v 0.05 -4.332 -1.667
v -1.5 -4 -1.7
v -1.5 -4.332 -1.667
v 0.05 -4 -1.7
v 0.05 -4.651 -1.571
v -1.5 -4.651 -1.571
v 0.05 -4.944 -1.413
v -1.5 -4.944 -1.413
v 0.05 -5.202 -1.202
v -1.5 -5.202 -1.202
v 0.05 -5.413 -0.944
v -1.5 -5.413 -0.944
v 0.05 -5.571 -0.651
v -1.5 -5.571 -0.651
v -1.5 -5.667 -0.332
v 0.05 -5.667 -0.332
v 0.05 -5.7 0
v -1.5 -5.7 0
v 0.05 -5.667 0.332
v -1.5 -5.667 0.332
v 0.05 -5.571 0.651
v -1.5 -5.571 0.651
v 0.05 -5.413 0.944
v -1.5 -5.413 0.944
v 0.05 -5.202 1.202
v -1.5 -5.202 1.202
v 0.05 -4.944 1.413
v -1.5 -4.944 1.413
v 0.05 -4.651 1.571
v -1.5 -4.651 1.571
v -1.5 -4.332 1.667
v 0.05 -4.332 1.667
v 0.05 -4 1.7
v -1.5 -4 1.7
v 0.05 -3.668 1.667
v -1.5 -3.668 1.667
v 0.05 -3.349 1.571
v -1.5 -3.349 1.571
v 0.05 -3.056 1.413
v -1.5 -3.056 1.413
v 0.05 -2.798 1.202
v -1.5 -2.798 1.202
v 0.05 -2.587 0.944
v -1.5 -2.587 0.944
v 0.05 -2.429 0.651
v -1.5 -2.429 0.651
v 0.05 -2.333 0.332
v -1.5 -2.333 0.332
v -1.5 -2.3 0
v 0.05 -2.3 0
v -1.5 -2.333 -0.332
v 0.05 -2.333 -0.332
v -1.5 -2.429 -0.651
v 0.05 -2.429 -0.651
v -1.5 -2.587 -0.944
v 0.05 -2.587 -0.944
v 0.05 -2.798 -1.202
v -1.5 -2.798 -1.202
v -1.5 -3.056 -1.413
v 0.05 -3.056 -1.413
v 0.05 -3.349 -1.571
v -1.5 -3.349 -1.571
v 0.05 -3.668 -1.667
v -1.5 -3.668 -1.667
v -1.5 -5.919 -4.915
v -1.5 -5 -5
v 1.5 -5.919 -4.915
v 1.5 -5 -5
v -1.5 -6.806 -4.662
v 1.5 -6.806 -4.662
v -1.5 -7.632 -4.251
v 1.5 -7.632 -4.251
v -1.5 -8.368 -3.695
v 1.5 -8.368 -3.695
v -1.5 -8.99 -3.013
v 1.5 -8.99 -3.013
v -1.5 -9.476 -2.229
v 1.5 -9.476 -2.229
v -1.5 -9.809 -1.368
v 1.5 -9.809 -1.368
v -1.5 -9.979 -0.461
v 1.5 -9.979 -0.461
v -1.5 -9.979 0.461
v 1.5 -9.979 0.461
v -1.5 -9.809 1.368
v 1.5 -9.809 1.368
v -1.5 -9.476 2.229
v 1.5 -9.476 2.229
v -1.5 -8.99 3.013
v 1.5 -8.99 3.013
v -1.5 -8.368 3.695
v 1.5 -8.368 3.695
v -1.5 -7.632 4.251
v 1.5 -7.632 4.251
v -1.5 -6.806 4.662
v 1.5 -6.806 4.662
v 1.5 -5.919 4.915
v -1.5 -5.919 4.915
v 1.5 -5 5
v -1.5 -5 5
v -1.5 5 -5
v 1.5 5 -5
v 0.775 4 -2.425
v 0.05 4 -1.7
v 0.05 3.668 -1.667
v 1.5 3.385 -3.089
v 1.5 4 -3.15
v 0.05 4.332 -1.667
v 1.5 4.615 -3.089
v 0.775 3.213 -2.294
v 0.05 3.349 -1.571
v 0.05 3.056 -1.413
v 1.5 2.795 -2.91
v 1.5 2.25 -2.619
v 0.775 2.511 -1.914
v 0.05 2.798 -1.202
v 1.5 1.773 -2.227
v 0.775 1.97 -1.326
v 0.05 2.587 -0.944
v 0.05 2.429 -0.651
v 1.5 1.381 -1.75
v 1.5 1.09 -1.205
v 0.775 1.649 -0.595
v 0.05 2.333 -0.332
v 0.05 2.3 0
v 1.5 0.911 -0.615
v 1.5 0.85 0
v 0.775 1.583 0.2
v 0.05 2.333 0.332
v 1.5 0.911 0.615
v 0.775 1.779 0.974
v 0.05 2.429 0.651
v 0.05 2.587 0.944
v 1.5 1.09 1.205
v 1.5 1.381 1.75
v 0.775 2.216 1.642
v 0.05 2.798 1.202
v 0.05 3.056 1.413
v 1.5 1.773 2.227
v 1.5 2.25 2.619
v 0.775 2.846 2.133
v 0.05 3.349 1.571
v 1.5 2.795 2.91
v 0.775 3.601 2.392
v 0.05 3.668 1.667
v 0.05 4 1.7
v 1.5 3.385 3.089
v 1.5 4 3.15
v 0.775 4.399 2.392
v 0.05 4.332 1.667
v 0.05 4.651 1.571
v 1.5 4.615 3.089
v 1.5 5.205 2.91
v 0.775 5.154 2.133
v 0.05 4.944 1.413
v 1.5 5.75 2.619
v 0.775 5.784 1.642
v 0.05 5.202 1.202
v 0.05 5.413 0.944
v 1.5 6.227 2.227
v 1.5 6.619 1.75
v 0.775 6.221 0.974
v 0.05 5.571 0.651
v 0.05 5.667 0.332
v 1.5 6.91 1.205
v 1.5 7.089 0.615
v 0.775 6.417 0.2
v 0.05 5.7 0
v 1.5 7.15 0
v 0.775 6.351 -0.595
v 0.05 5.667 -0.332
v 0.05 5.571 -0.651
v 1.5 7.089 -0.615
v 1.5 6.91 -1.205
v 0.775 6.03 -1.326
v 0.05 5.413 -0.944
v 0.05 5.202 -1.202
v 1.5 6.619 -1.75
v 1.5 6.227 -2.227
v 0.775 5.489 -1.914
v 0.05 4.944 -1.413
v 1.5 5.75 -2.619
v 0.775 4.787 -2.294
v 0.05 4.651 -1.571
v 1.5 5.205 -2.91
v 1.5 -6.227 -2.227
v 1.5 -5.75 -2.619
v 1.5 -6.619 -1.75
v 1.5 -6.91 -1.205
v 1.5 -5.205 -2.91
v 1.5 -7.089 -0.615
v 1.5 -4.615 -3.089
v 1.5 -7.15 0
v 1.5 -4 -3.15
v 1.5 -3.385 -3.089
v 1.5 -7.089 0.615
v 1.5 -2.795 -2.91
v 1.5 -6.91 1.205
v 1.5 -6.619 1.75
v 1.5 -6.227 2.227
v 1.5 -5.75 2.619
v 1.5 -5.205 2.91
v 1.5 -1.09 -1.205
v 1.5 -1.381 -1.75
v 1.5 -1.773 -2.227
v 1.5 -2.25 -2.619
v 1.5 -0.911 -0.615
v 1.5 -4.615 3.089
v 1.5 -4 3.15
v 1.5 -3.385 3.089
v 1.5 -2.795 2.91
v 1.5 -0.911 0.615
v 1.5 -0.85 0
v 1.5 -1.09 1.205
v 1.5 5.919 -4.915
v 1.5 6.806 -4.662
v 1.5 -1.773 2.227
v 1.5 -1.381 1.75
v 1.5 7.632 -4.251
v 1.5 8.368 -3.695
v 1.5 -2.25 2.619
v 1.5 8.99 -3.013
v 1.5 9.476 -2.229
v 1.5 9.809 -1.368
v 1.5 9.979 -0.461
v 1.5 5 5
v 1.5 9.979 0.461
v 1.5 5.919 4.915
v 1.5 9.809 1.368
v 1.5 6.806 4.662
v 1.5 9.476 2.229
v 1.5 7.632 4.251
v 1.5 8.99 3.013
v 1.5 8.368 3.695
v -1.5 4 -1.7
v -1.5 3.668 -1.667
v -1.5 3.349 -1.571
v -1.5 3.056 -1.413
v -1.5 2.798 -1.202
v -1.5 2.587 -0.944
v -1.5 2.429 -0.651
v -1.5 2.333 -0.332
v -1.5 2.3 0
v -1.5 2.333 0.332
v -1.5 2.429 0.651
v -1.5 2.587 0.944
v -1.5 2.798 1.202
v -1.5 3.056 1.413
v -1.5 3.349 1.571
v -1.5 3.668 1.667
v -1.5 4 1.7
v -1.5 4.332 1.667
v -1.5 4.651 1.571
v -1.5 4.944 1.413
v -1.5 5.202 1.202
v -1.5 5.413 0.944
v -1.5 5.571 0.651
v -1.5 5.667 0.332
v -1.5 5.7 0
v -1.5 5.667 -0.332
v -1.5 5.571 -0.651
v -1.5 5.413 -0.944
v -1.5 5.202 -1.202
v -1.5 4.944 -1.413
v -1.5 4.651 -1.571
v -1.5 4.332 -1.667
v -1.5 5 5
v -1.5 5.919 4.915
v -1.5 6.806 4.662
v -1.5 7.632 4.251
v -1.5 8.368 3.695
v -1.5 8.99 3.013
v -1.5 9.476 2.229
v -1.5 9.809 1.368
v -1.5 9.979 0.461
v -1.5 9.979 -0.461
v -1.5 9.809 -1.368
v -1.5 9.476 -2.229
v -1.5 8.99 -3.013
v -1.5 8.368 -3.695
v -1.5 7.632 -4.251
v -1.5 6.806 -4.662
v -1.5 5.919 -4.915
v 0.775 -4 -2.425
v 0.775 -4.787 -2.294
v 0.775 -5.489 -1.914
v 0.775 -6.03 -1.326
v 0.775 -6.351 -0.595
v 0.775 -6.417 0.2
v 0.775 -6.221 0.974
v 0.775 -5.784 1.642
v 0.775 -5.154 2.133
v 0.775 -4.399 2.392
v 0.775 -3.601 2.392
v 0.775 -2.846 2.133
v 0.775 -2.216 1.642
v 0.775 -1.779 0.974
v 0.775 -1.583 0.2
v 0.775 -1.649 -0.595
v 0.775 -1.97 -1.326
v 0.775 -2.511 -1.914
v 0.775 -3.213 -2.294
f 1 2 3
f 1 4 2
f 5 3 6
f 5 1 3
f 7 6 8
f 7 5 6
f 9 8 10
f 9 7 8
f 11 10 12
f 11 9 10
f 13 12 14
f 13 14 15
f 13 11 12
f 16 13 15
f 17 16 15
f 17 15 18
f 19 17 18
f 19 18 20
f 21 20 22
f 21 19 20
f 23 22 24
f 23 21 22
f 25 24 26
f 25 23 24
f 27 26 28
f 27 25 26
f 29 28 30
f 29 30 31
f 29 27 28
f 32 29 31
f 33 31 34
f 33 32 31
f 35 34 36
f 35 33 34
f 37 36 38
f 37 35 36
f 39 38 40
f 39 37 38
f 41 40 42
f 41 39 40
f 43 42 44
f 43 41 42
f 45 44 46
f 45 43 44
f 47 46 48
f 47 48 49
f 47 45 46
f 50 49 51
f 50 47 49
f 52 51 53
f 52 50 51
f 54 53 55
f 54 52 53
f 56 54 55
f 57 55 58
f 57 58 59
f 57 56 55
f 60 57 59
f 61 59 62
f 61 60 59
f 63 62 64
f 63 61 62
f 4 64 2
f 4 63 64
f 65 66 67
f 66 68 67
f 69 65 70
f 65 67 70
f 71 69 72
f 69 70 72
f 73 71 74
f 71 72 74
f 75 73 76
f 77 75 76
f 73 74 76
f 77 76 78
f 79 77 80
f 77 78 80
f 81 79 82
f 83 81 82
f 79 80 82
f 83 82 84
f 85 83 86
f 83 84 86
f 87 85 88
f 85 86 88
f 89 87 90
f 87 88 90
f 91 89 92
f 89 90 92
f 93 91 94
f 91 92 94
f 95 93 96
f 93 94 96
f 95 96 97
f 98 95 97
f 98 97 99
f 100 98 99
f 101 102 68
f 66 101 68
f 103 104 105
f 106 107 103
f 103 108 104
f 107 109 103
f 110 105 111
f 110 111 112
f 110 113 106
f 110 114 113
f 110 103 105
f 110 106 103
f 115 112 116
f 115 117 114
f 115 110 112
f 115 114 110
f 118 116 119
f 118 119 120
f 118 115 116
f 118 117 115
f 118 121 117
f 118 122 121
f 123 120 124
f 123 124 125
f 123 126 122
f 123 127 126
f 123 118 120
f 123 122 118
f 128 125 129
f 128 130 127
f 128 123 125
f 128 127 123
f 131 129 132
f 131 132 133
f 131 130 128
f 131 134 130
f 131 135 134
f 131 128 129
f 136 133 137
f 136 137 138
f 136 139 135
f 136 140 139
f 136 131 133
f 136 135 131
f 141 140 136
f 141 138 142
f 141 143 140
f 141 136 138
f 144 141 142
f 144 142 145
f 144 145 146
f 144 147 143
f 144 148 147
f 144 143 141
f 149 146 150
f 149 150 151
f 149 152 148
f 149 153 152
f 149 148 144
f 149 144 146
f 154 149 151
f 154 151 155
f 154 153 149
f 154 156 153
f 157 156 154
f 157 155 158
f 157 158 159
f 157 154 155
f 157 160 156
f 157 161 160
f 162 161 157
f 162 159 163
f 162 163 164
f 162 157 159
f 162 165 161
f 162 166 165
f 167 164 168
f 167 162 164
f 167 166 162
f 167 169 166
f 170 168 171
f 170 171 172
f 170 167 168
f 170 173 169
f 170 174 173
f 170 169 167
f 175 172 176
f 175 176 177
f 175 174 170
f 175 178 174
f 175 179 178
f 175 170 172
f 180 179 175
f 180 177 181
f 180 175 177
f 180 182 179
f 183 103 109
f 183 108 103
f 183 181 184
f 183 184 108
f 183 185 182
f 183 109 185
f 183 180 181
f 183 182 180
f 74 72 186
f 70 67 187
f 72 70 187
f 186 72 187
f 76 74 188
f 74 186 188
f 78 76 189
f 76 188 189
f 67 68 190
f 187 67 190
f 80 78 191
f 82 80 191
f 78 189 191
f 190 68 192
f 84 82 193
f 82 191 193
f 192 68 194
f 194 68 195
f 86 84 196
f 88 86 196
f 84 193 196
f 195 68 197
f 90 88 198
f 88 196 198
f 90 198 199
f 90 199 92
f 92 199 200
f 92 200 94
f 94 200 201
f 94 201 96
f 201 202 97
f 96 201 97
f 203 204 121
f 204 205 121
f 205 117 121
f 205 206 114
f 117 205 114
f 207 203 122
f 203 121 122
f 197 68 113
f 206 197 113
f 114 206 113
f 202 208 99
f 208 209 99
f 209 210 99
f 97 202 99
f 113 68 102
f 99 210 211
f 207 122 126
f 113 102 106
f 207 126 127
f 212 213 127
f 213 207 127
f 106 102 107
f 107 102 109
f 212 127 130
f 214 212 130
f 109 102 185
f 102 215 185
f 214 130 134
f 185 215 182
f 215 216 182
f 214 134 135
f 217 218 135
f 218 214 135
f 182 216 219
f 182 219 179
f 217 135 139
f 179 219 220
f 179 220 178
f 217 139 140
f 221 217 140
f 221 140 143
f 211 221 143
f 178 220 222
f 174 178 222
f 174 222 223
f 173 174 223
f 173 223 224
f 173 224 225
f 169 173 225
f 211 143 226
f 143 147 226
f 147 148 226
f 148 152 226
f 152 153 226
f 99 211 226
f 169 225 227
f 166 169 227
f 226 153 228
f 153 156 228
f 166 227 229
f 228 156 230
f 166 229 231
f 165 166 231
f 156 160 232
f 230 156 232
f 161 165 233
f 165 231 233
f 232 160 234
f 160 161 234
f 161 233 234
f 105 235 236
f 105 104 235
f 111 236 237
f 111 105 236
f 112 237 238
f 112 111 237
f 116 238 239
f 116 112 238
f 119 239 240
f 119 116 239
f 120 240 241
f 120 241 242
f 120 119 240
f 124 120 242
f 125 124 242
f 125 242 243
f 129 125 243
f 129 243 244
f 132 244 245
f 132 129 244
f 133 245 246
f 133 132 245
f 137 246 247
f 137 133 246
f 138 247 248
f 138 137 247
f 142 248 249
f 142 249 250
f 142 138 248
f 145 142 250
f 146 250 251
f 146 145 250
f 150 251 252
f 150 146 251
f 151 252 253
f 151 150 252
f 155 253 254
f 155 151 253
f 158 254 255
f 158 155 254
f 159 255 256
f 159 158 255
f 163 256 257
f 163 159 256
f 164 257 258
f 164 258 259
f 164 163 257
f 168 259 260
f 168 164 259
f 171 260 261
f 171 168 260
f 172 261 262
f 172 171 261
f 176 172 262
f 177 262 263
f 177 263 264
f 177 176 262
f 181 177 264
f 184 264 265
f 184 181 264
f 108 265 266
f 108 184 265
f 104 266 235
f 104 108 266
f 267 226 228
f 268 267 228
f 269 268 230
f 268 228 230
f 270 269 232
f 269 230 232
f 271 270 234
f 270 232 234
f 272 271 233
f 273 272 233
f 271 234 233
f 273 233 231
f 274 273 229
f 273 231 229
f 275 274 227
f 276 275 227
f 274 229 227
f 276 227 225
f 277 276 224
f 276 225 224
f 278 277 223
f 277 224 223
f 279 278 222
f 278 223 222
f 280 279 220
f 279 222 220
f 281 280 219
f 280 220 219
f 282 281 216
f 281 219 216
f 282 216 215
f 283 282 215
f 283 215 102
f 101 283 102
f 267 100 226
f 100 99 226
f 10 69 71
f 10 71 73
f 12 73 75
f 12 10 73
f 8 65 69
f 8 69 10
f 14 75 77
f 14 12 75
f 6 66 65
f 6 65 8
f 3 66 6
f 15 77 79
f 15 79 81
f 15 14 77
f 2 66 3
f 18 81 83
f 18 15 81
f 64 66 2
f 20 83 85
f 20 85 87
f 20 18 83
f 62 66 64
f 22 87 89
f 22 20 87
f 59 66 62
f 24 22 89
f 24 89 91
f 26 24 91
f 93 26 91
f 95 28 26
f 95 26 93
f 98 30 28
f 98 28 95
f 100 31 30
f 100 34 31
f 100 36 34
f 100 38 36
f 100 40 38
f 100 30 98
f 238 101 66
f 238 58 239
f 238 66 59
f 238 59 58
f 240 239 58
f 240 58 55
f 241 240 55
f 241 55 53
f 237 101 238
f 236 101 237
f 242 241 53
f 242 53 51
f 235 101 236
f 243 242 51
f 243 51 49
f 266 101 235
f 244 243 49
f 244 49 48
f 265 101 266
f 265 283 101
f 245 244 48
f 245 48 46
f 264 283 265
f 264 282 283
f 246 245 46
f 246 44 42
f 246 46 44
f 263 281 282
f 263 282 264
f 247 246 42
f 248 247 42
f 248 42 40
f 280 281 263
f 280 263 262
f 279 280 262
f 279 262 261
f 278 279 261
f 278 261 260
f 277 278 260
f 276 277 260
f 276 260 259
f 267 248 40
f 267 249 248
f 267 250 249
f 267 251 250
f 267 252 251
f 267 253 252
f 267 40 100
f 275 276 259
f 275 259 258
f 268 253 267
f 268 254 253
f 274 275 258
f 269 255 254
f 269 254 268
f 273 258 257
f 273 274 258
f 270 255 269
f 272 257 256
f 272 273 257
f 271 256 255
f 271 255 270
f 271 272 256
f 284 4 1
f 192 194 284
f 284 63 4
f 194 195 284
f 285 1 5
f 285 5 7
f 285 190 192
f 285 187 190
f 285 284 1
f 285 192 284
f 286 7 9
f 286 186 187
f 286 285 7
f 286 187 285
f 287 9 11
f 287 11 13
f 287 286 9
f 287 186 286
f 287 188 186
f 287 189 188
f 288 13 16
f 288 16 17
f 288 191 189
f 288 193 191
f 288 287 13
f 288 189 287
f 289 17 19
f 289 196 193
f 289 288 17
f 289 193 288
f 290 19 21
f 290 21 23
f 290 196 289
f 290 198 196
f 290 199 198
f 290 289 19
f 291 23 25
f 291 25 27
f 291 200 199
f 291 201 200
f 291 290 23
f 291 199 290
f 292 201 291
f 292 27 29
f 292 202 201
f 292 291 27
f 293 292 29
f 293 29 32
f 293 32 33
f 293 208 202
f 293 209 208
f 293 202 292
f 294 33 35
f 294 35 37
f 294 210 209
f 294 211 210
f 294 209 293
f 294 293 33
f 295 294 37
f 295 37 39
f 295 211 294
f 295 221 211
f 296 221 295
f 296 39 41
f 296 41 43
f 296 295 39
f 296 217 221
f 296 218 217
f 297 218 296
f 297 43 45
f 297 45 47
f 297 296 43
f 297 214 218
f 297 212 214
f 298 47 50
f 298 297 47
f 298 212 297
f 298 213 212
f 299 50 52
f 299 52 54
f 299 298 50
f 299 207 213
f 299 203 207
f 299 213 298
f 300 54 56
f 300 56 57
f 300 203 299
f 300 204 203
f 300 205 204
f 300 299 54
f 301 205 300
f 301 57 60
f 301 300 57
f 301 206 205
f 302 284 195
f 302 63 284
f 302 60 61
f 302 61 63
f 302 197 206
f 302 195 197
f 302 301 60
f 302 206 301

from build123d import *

# Parameters (mm, degrees)
BOSS_EXTRUDE1_DEPTH                          = 1.5
CSK_FOR_M3_COUNTERSUNK_FLAT_HEAD_SCR_2_COUNT = 2
CSK_FOR_M3_COUNTERSUNK_FLAT_HEAD_SCR_2_PITCH = 8


with BuildPart() as part:
    # Sketch1 → Boss-Extrude1 (new, symmetric)
    with BuildSketch(Plane(origin=(0, 0, 0), x_dir=(0, 0, -1), z_dir=(1, 0, 0))):
        with BuildLine():
            Line((5, 5), (5, -5))
            ThreePointArc((5, -5), (0, -10), (-5, -5))
            Line((-5, -5), (-5, 5))
            ThreePointArc((-5, 5), (0, 10), (5, 5))
        make_face()
    extrude(amount=BOSS_EXTRUDE1_DEPTH, both=True)

    # Sketch3 → CSK for M3 Countersunk Flat Head Screw1 (revolve, cut)
    with BuildSketch(Plane(origin=(1.5, 4, 0), x_dir=(0, 0, -1), z_dir=(0, 1, 0))):
        Polygon((0, 0), (0, 3), (1.7, 3), (1.7, 1.45), (3.15, 0), align=None)
    csk_for_m3_countersunk_flat_head_screw1 = revolve(axis=Axis((7.85, 4, 0), (-1, 0, 0)), mode=Mode.SUBTRACT)

    # CSK for M3 Countersunk Flat Head Scr 2: CSK for M3 Countersunk Flat Head Screw1 ×2
    with Locations(*[(0, -i * CSK_FOR_M3_COUNTERSUNK_FLAT_HEAD_SCR_2_PITCH, 0) for i in range(1, CSK_FOR_M3_COUNTERSUNK_FLAT_HEAD_SCR_2_COUNT)]):
        add(csk_for_m3_countersunk_flat_head_screw1, mode=Mode.SUBTRACT)


solid = part.part
